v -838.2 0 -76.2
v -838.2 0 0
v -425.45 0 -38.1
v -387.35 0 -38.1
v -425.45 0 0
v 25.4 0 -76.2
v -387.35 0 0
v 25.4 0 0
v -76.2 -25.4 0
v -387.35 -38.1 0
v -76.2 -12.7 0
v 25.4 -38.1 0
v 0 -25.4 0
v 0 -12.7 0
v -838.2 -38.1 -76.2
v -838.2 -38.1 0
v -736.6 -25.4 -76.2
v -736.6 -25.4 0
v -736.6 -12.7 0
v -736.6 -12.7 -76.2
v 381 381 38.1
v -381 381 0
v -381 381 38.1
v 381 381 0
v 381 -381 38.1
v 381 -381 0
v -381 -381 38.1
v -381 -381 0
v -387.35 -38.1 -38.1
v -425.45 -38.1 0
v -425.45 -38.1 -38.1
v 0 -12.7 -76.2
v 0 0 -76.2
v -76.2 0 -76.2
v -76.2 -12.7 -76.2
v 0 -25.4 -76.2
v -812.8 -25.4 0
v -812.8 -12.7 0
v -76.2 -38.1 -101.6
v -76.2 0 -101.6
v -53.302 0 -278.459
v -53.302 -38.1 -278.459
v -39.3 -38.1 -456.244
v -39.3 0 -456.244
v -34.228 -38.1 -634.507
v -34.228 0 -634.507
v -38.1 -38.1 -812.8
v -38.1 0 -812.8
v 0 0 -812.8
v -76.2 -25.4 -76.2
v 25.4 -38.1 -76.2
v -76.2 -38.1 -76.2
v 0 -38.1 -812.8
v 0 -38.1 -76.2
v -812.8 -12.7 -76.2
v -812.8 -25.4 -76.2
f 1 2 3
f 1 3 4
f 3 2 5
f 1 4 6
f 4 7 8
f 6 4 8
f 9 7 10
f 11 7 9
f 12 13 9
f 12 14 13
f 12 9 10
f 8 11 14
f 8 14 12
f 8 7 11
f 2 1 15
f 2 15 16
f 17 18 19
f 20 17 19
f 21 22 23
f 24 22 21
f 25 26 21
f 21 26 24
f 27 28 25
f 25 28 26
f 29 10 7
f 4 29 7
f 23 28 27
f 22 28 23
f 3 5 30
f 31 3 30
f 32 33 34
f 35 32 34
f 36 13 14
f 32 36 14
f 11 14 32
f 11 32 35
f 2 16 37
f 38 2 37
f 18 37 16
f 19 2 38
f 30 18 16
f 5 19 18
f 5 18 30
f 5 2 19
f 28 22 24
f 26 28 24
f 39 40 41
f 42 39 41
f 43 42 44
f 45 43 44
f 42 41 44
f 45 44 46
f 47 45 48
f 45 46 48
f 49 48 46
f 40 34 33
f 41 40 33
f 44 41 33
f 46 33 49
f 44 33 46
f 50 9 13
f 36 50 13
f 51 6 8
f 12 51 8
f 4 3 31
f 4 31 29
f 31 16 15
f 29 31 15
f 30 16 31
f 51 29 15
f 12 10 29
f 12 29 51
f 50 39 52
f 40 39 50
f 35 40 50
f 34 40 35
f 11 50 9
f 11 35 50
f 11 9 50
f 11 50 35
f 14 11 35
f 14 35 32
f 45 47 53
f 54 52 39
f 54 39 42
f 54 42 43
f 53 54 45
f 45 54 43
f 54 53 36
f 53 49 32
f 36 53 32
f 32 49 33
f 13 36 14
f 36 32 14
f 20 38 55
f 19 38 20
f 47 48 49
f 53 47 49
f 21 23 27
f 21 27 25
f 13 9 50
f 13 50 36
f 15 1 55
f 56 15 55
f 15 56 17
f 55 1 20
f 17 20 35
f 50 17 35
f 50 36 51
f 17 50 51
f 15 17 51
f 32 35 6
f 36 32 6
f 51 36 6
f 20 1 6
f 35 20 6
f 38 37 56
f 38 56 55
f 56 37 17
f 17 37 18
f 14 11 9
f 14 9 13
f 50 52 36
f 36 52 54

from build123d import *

# Parameters (mm, degrees)
F0_W      = 76.2
F0_H      = 101.6
F1_DEPTH  = 38.1
F2_W      = 76.2
F2_H      = 76.2
F3_DEPTH  = 12.7
F4_W      = 76.2
F4_H      = 76.2
F5_DEPTH  = 12.7
F6_W      = 863.6
F6_H      = 76.2
F7_DEPTH  = 38.1
F8_W      = 76.2
F8_H      = 12.7
F9_DEPTH  = 812.801
F11_DEPTH = 38.1
F12_W     = 762
F12_H     = 762
F13_DEPTH = 38.1


with BuildPart() as f1:
    # F0 (on Front) → F1 (new body)
    with BuildSketch(Plane.XZ):
        with Locations((-38.1, -50.8)):
            Rectangle(F0_W, F0_H)
        with BuildLine():
            Line((0, -101.6), (-76.2, -101.6))
            ThreePointArc((-76.2, -101.6), (-39.2996381375, -456.2437306145), (-38.1, -812.8))
            Line((-38.1, -812.8), (0, -812.8))
            Line((0, -812.8), (0, -101.6))
        make_face()
    extrude(amount=F1_DEPTH)

    # F2 (on face) → F3 (cut)
    with BuildSketch(Plane.XZ.offset(38.1)):
        with Locations((-38.1, -38.1)):
            Rectangle(F2_W, F2_H)
    extrude(amount=-F3_DEPTH, mode=Mode.SUBTRACT)

    # F4 (on face) → F5 (cut)
    with BuildSketch(Plane(origin=(0, 0, 0), x_dir=(-1, 0, 0), z_dir=(0, 1, 0))):
        with Locations((38.1, -38.1)):
            Rectangle(F4_W, F4_H)
    extrude(amount=-F5_DEPTH, mode=Mode.SUBTRACT)


with BuildPart() as f7:
    # F6 (on Front) → F7 (new body)
    with BuildSketch(Plane.XZ):
        with Locations((-406.4, -38.1)):
            Rectangle(F6_W, F6_H)
    extrude(amount=F7_DEPTH)

    # F8 (on face) → F9 (cut, through all)
    with BuildSketch(Plane.XY):
        with Locations((-38.1, -19.05)):
            Rectangle(F8_W, F8_H)
        with Locations((-774.7, -19.05)):
            Rectangle(F8_W, F8_H)
    extrude(amount=-F9_DEPTH, mode=Mode.SUBTRACT)

    # F10 (on face) → F11 (cut)
    with BuildSketch(Plane.XY):
        Polygon((-406.4, 0), (-425.45, 0), (-425.45, -38.1), (-406.4, -38.1), (-387.35, -38.1), (-387.35, 0), align=None)
    extrude(amount=-F11_DEPTH, mode=Mode.SUBTRACT)


with BuildPart() as f13:
    # F12 (on face) → F13 (new body)
    with BuildSketch(Plane.XY):
        Rectangle(F12_W, F12_H)
    extrude(amount=F13_DEPTH)


solid = Compound([f1.part, f7.part, f13.part])
